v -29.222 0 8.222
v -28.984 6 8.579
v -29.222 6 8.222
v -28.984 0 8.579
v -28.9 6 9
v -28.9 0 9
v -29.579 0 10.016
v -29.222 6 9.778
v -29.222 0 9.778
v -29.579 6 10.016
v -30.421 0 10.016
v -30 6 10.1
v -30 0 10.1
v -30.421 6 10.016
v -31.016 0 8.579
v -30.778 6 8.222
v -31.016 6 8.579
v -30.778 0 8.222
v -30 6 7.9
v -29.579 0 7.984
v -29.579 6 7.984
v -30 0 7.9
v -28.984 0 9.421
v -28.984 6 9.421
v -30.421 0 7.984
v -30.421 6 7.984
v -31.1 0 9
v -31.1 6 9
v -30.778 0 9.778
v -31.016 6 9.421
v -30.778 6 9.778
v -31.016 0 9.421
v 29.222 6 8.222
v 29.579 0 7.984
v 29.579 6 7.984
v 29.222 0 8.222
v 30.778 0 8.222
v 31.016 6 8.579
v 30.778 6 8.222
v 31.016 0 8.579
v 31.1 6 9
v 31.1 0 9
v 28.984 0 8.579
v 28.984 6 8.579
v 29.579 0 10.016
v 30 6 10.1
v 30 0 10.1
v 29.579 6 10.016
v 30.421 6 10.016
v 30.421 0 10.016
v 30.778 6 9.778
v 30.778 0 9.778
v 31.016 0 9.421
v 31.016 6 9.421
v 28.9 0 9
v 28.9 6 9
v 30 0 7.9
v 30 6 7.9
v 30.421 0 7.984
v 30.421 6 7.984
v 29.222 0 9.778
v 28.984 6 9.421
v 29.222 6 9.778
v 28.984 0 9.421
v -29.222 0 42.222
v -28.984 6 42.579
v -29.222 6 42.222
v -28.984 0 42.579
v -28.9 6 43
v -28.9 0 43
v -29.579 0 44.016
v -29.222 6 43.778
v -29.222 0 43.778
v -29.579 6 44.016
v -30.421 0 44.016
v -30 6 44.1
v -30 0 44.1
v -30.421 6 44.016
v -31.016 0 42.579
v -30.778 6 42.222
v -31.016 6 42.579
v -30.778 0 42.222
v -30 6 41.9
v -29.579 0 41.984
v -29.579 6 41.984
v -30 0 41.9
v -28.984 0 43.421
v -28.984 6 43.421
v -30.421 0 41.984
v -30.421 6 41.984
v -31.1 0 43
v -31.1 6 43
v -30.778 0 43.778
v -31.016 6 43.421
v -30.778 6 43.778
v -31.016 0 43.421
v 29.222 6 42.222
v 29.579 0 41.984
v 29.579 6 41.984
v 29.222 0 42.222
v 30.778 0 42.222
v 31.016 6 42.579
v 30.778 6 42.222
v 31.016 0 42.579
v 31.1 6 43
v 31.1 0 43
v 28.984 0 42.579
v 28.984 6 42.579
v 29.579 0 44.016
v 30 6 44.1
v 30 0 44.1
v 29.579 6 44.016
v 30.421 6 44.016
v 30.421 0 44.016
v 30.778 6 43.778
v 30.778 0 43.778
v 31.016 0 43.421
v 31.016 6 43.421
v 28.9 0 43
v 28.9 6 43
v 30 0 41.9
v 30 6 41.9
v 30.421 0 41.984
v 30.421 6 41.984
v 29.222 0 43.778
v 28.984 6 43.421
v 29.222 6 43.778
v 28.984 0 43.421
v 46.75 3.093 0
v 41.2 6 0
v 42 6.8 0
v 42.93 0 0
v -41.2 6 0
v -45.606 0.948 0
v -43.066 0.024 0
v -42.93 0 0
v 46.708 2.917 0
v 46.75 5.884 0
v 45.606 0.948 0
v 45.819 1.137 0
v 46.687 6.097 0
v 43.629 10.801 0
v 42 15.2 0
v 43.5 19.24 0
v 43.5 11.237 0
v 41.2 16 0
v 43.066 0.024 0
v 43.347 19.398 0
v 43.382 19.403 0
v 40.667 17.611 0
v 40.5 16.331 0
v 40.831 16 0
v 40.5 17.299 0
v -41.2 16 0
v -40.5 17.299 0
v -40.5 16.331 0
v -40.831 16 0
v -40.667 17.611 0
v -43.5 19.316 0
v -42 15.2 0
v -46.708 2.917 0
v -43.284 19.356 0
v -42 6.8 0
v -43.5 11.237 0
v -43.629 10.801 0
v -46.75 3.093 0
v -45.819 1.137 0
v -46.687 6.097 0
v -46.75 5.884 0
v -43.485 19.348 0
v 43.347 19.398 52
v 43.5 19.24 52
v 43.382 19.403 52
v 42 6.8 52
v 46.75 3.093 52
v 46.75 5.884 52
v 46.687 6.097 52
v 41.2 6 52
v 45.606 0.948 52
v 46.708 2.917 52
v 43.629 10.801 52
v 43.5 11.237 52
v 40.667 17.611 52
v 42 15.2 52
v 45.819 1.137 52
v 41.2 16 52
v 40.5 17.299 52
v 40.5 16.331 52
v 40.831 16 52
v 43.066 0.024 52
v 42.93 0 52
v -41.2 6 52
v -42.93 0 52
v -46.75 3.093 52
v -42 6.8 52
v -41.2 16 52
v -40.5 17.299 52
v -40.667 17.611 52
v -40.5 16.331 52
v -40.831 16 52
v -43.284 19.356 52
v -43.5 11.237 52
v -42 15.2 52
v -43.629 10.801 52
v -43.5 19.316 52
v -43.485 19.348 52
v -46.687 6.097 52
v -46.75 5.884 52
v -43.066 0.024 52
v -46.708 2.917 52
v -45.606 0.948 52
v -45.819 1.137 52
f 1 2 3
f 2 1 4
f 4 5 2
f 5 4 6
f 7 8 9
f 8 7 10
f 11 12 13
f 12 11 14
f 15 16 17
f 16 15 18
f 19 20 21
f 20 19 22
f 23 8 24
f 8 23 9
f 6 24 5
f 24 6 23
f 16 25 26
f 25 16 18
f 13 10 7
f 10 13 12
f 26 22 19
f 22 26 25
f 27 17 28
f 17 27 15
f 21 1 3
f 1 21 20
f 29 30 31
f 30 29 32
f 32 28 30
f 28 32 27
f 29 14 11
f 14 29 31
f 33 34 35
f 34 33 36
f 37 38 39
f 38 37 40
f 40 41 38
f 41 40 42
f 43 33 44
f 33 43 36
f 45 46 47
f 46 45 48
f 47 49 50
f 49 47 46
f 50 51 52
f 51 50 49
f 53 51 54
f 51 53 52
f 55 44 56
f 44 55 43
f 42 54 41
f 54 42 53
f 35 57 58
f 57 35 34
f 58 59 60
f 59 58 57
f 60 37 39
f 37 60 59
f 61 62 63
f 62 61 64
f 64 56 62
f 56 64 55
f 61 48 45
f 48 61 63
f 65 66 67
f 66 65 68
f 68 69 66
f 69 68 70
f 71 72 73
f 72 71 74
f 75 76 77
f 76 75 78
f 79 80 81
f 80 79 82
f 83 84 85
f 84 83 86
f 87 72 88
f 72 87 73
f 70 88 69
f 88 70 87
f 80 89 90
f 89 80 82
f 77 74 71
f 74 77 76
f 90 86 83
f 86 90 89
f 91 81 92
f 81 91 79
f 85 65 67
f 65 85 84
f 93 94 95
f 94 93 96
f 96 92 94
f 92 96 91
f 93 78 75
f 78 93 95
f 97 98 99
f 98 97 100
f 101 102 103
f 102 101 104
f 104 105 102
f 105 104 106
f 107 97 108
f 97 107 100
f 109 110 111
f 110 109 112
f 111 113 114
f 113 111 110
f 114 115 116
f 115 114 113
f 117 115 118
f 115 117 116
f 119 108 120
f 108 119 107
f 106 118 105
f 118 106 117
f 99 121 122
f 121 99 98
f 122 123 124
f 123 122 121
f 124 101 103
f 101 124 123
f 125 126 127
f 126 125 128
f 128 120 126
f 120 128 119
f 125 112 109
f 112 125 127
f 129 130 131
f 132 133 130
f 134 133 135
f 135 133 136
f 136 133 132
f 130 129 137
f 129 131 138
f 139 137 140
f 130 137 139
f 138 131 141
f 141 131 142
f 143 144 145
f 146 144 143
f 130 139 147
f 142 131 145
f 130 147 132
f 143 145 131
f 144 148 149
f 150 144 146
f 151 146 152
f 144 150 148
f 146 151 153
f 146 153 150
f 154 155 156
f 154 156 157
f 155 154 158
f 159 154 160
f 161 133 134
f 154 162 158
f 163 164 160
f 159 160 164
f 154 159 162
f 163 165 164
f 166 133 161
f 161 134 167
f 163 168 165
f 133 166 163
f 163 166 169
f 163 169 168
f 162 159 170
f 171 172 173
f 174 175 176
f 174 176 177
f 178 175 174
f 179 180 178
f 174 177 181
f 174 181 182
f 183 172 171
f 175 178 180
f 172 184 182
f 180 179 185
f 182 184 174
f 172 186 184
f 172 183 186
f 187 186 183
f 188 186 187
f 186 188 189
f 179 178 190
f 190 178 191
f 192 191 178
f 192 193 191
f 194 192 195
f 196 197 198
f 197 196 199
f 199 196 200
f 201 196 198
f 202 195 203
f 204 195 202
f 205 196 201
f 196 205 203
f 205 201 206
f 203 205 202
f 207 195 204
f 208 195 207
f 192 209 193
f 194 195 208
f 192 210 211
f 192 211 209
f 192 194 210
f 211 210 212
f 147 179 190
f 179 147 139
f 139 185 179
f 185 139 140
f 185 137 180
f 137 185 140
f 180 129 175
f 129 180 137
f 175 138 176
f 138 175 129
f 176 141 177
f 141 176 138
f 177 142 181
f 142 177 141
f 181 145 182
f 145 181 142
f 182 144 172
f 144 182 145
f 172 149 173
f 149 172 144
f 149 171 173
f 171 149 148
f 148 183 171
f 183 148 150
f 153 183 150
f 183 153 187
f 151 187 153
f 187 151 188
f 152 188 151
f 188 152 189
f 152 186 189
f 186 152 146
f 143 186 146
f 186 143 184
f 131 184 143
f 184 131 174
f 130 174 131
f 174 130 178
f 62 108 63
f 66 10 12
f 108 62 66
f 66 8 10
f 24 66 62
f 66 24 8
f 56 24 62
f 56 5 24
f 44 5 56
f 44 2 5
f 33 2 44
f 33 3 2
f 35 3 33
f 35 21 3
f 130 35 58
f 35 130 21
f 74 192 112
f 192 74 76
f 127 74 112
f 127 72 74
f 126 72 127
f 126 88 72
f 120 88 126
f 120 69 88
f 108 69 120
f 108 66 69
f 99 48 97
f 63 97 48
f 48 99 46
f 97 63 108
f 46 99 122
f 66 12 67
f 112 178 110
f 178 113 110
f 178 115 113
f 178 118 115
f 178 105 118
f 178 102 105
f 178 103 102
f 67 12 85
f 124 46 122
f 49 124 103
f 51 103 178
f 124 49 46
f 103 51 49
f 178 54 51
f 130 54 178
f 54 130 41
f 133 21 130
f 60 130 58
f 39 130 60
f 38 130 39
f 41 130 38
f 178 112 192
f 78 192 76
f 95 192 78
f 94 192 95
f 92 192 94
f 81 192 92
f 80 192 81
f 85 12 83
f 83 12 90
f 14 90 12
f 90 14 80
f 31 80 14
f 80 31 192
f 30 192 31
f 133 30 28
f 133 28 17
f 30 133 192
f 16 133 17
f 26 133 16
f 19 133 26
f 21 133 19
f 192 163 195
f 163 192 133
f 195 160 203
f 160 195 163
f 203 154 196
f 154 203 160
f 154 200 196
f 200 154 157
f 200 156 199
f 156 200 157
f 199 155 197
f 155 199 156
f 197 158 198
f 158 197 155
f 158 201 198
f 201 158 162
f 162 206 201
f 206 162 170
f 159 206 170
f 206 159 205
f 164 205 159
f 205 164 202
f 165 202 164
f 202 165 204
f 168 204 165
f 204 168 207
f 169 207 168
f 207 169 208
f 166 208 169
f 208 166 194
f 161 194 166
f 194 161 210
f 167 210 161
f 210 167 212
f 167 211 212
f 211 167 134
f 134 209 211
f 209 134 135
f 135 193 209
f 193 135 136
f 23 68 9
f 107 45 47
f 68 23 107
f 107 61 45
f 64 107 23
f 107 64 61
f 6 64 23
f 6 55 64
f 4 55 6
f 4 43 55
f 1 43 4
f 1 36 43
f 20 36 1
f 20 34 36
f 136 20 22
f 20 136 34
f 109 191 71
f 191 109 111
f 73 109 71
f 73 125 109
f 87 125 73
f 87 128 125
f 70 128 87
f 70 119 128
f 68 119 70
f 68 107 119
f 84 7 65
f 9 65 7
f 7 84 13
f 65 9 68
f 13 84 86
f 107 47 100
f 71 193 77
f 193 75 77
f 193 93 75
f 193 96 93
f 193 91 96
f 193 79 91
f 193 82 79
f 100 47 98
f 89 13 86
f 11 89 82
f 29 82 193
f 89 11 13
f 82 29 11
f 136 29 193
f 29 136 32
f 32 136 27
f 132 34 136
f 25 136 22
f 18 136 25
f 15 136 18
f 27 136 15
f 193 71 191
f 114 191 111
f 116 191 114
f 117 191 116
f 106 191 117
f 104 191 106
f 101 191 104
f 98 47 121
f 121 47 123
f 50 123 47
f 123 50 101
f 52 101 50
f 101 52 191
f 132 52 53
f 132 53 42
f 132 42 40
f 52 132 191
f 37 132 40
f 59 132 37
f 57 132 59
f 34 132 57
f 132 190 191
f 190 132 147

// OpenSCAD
// file: paths.scad
function sumTo(v,n) = n<=0 ? 0 : v[n-1]+sumTo(v,n-1);
function sum(v) = sumTo(v,len(v));
function interpolationData(v) = let(
    n=len(v)-1,
    d=[for (i=[0:n-1]) norm(v[i]-v[i+1])],
    sumD=[for (i=[0:n]) sumTo(d,i)],
    totalD=sumD[n]) 
        [d,sumD,v,totalD];
function totalLength(interp) = interp[3];
function interpolatePoints(a,b,t) = (1-t)*a+(t)*b;
function findSegmentByDistance(sumD,distance) = let(
    found = [for(i=[0:len(sumD)-1]) if(sumD[i]<=distance && distance<sumD[i+1]) i])
        len(found)>0 ? found[0] : -1;
function interpolateByDistance(interp,distance) = let(
    n=len(interp[1])-1,
    d=interp[0],
    sumD=interp[1],
    v=interp[2],
    totalD=interp[3],
    i=findSegmentByDistance(sumD,distance))
        i<0 ? (distance<totalD/2 ? v[0] : v[n]) :
            interpolatePoints(v[i],v[i+1],(distance-sumD[i])/d[i]);
function get2DNormalBetweenPoints(a,b) = let(
    v = (b-a)/norm(b-a))
        [v[1],-v[0]];
function getTangentByDistance(interp,distance) = let(
    n=len(interp[1])-1,
    d=interp[0],
    sumD=interp[1],
    v=interp[2],
    totalD=interp[3],
    i0=findSegmentByDistance(sumD,distance),
    i = i0 < 0 ? (distance<totalD/2 ? 0 : n-1) : i0)
        (v[i+1]-v[i])/norm(v[i+1]-v[i]);
    
function interpolateByParameter(interp,t) = interpolateByDistance(interp,t*totalLength(interp));
function singleInterpolateByDistance(v,distance) = interpolateByDistance(interpolationData(v),distance);
function singleInterpolateByParameter(v,t) = interpolateByParameter(interpolationData(v),t);
function measurePath(v) = totalLength(interpolationData(v));

function findCoordinateIntersection2(a,b,index,value) = 
    a[index] == value ? a : 
        b[index] == value ? b :
            let( t=(value-a[index]) / (b[index]-a[index]))
                (1-t)*a+t*b;

function findCoordinateIntersections(path,index,value) = 
    [for (i=[0:len(path)-2]) if ((path[i][index]-value)*(path[i+1][index]-value) <= 0) findCoordinateIntersection2(path[i],path[i+1],index,value)];            

function mirrorMatrix(normalVector) = let(v = normalVector/norm(normalVector)) len(v)<3 ? [[1-2*v[0]*v[0],-2*v[0]*v[1]],[-2*v[0]*v[1],1-2*v[1]*v[1]]] : [[1-2*v[0]*v[0],-2*v[0]*v[1],-2*v[0]*v[2]],[-2*v[0]*v[1],1-2*v[1]*v[1],-2*v[1]*v[2]],[-2*v[0]*v[2],-2*v[1]*v[2],1-2*v[2]*v[2]]];

function trimArray(a, n) = [for (i=[0:n-1]) a[i]];

function transformPoint(matrix,a) = 
    let(n=len(a))
        len(matrix[0])==n+1 ? 
            trimArray(matrix * concat(a,[1]), n)
            : matrix * a;

function transformPath(matrix,path) =
    [for (a=path) transformPoint(matrix,a)];

function reverseArray(array) = let(n=len(array)) [for (i=[0:n-1]) array[n-1-i]];

function stitchPaths(a,b) = let(na=len(a)) [for (i=[0:na+len(b)-2]) i<na? a[i] : b[i-na+1]-b[0]+a[na-1]];

//interp = interpolationData([[1,2],[2,3],[1,2]]);
//echo(singleInterpolateByParameter([[1,1],[2,2],[3,1]],0.75));
//echo(measurePath([[1,2],[2,3],[1,2]]));
// main file
use <paths.scad>;

//<params>
attachmentThickness = 2.5;
attachmentWidth = 18;
b1 = 79.5+6.5;
b1a = 85.0+6.5;
b2 = 87+6.5;
h1a = 1;
bumpHeight = 3;
extraThickness = 3; //3.5;
phoneWidth = 77.5+6.5;
snapHeight = 10;
snapInset = 1.5;
snapThickness = 1.5;
holderWidth = 52;
rounding = 0.8;
holeSize = 2.2;
holeSpacing = 60;
//</params>

module dummy() {}

nudge = 0.001;

rightPath = 
  [ [b1/2,0],
    [b1a/2,h1a],
    [b2/2,bumpHeight],
    [b2/2,bumpHeight+extraThickness],
    [phoneWidth/2+snapThickness,bumpHeight+extraThickness+snapHeight*0.5],
    [phoneWidth/2+snapThickness,bumpHeight+extraThickness+snapHeight+snapThickness+2],
    [phoneWidth/2-snapInset,bumpHeight+extraThickness+snapHeight+snapThickness],
    [phoneWidth/2-snapInset,bumpHeight+extraThickness+snapHeight],
    [phoneWidth/2,bumpHeight+extraThickness+snapHeight],
    [phoneWidth/2,bumpHeight+extraThickness],
    [0, bumpHeight+extraThickness]];
    
    
path = stitchPaths(rightPath,reverseArray(transformPath(mirrorMatrix([1,0]),rightPath)));

module mainHolder() {
    linear_extrude(height=holderWidth) 
offset(r=-rounding) offset(r=rounding) polygon(points=path);
}

module holes(extra=0) {
    for(i=[0:1]) translate(-[0,attachmentWidth/2+i*(holderWidth-attachmentWidth),0]) {
    translate([-holeSpacing/2,0,-50]) cylinder(d=holeSize+extra,h=100,$fn=16);
    translate([holeSpacing/2,0,-50]) cylinder(d=holeSize+extra,h=100,$fn=16);
    }
}

module attachment() {
    difference() {
       // hull()
    for(i=[0:1]) translate(-[0,attachmentWidth/2+i*(holderWidth-attachmentWidth),0]) 
        union()
        {
            translate([-holeSpacing/2,0,0]) cylinder(d=attachmentWidth, h=attachmentThickness);
            translate([holeSpacing/2,0,0]) cylinder(d=attachmentWidth, h=attachmentThickness);
        }
    holes(extra=1.5);
    }
}

render(convexity=2) {
    difference() {
        mainHolder();
        rotate([-90,0,0]) holes();
    }
//    translate([0,-10,0]) attachment();
}
